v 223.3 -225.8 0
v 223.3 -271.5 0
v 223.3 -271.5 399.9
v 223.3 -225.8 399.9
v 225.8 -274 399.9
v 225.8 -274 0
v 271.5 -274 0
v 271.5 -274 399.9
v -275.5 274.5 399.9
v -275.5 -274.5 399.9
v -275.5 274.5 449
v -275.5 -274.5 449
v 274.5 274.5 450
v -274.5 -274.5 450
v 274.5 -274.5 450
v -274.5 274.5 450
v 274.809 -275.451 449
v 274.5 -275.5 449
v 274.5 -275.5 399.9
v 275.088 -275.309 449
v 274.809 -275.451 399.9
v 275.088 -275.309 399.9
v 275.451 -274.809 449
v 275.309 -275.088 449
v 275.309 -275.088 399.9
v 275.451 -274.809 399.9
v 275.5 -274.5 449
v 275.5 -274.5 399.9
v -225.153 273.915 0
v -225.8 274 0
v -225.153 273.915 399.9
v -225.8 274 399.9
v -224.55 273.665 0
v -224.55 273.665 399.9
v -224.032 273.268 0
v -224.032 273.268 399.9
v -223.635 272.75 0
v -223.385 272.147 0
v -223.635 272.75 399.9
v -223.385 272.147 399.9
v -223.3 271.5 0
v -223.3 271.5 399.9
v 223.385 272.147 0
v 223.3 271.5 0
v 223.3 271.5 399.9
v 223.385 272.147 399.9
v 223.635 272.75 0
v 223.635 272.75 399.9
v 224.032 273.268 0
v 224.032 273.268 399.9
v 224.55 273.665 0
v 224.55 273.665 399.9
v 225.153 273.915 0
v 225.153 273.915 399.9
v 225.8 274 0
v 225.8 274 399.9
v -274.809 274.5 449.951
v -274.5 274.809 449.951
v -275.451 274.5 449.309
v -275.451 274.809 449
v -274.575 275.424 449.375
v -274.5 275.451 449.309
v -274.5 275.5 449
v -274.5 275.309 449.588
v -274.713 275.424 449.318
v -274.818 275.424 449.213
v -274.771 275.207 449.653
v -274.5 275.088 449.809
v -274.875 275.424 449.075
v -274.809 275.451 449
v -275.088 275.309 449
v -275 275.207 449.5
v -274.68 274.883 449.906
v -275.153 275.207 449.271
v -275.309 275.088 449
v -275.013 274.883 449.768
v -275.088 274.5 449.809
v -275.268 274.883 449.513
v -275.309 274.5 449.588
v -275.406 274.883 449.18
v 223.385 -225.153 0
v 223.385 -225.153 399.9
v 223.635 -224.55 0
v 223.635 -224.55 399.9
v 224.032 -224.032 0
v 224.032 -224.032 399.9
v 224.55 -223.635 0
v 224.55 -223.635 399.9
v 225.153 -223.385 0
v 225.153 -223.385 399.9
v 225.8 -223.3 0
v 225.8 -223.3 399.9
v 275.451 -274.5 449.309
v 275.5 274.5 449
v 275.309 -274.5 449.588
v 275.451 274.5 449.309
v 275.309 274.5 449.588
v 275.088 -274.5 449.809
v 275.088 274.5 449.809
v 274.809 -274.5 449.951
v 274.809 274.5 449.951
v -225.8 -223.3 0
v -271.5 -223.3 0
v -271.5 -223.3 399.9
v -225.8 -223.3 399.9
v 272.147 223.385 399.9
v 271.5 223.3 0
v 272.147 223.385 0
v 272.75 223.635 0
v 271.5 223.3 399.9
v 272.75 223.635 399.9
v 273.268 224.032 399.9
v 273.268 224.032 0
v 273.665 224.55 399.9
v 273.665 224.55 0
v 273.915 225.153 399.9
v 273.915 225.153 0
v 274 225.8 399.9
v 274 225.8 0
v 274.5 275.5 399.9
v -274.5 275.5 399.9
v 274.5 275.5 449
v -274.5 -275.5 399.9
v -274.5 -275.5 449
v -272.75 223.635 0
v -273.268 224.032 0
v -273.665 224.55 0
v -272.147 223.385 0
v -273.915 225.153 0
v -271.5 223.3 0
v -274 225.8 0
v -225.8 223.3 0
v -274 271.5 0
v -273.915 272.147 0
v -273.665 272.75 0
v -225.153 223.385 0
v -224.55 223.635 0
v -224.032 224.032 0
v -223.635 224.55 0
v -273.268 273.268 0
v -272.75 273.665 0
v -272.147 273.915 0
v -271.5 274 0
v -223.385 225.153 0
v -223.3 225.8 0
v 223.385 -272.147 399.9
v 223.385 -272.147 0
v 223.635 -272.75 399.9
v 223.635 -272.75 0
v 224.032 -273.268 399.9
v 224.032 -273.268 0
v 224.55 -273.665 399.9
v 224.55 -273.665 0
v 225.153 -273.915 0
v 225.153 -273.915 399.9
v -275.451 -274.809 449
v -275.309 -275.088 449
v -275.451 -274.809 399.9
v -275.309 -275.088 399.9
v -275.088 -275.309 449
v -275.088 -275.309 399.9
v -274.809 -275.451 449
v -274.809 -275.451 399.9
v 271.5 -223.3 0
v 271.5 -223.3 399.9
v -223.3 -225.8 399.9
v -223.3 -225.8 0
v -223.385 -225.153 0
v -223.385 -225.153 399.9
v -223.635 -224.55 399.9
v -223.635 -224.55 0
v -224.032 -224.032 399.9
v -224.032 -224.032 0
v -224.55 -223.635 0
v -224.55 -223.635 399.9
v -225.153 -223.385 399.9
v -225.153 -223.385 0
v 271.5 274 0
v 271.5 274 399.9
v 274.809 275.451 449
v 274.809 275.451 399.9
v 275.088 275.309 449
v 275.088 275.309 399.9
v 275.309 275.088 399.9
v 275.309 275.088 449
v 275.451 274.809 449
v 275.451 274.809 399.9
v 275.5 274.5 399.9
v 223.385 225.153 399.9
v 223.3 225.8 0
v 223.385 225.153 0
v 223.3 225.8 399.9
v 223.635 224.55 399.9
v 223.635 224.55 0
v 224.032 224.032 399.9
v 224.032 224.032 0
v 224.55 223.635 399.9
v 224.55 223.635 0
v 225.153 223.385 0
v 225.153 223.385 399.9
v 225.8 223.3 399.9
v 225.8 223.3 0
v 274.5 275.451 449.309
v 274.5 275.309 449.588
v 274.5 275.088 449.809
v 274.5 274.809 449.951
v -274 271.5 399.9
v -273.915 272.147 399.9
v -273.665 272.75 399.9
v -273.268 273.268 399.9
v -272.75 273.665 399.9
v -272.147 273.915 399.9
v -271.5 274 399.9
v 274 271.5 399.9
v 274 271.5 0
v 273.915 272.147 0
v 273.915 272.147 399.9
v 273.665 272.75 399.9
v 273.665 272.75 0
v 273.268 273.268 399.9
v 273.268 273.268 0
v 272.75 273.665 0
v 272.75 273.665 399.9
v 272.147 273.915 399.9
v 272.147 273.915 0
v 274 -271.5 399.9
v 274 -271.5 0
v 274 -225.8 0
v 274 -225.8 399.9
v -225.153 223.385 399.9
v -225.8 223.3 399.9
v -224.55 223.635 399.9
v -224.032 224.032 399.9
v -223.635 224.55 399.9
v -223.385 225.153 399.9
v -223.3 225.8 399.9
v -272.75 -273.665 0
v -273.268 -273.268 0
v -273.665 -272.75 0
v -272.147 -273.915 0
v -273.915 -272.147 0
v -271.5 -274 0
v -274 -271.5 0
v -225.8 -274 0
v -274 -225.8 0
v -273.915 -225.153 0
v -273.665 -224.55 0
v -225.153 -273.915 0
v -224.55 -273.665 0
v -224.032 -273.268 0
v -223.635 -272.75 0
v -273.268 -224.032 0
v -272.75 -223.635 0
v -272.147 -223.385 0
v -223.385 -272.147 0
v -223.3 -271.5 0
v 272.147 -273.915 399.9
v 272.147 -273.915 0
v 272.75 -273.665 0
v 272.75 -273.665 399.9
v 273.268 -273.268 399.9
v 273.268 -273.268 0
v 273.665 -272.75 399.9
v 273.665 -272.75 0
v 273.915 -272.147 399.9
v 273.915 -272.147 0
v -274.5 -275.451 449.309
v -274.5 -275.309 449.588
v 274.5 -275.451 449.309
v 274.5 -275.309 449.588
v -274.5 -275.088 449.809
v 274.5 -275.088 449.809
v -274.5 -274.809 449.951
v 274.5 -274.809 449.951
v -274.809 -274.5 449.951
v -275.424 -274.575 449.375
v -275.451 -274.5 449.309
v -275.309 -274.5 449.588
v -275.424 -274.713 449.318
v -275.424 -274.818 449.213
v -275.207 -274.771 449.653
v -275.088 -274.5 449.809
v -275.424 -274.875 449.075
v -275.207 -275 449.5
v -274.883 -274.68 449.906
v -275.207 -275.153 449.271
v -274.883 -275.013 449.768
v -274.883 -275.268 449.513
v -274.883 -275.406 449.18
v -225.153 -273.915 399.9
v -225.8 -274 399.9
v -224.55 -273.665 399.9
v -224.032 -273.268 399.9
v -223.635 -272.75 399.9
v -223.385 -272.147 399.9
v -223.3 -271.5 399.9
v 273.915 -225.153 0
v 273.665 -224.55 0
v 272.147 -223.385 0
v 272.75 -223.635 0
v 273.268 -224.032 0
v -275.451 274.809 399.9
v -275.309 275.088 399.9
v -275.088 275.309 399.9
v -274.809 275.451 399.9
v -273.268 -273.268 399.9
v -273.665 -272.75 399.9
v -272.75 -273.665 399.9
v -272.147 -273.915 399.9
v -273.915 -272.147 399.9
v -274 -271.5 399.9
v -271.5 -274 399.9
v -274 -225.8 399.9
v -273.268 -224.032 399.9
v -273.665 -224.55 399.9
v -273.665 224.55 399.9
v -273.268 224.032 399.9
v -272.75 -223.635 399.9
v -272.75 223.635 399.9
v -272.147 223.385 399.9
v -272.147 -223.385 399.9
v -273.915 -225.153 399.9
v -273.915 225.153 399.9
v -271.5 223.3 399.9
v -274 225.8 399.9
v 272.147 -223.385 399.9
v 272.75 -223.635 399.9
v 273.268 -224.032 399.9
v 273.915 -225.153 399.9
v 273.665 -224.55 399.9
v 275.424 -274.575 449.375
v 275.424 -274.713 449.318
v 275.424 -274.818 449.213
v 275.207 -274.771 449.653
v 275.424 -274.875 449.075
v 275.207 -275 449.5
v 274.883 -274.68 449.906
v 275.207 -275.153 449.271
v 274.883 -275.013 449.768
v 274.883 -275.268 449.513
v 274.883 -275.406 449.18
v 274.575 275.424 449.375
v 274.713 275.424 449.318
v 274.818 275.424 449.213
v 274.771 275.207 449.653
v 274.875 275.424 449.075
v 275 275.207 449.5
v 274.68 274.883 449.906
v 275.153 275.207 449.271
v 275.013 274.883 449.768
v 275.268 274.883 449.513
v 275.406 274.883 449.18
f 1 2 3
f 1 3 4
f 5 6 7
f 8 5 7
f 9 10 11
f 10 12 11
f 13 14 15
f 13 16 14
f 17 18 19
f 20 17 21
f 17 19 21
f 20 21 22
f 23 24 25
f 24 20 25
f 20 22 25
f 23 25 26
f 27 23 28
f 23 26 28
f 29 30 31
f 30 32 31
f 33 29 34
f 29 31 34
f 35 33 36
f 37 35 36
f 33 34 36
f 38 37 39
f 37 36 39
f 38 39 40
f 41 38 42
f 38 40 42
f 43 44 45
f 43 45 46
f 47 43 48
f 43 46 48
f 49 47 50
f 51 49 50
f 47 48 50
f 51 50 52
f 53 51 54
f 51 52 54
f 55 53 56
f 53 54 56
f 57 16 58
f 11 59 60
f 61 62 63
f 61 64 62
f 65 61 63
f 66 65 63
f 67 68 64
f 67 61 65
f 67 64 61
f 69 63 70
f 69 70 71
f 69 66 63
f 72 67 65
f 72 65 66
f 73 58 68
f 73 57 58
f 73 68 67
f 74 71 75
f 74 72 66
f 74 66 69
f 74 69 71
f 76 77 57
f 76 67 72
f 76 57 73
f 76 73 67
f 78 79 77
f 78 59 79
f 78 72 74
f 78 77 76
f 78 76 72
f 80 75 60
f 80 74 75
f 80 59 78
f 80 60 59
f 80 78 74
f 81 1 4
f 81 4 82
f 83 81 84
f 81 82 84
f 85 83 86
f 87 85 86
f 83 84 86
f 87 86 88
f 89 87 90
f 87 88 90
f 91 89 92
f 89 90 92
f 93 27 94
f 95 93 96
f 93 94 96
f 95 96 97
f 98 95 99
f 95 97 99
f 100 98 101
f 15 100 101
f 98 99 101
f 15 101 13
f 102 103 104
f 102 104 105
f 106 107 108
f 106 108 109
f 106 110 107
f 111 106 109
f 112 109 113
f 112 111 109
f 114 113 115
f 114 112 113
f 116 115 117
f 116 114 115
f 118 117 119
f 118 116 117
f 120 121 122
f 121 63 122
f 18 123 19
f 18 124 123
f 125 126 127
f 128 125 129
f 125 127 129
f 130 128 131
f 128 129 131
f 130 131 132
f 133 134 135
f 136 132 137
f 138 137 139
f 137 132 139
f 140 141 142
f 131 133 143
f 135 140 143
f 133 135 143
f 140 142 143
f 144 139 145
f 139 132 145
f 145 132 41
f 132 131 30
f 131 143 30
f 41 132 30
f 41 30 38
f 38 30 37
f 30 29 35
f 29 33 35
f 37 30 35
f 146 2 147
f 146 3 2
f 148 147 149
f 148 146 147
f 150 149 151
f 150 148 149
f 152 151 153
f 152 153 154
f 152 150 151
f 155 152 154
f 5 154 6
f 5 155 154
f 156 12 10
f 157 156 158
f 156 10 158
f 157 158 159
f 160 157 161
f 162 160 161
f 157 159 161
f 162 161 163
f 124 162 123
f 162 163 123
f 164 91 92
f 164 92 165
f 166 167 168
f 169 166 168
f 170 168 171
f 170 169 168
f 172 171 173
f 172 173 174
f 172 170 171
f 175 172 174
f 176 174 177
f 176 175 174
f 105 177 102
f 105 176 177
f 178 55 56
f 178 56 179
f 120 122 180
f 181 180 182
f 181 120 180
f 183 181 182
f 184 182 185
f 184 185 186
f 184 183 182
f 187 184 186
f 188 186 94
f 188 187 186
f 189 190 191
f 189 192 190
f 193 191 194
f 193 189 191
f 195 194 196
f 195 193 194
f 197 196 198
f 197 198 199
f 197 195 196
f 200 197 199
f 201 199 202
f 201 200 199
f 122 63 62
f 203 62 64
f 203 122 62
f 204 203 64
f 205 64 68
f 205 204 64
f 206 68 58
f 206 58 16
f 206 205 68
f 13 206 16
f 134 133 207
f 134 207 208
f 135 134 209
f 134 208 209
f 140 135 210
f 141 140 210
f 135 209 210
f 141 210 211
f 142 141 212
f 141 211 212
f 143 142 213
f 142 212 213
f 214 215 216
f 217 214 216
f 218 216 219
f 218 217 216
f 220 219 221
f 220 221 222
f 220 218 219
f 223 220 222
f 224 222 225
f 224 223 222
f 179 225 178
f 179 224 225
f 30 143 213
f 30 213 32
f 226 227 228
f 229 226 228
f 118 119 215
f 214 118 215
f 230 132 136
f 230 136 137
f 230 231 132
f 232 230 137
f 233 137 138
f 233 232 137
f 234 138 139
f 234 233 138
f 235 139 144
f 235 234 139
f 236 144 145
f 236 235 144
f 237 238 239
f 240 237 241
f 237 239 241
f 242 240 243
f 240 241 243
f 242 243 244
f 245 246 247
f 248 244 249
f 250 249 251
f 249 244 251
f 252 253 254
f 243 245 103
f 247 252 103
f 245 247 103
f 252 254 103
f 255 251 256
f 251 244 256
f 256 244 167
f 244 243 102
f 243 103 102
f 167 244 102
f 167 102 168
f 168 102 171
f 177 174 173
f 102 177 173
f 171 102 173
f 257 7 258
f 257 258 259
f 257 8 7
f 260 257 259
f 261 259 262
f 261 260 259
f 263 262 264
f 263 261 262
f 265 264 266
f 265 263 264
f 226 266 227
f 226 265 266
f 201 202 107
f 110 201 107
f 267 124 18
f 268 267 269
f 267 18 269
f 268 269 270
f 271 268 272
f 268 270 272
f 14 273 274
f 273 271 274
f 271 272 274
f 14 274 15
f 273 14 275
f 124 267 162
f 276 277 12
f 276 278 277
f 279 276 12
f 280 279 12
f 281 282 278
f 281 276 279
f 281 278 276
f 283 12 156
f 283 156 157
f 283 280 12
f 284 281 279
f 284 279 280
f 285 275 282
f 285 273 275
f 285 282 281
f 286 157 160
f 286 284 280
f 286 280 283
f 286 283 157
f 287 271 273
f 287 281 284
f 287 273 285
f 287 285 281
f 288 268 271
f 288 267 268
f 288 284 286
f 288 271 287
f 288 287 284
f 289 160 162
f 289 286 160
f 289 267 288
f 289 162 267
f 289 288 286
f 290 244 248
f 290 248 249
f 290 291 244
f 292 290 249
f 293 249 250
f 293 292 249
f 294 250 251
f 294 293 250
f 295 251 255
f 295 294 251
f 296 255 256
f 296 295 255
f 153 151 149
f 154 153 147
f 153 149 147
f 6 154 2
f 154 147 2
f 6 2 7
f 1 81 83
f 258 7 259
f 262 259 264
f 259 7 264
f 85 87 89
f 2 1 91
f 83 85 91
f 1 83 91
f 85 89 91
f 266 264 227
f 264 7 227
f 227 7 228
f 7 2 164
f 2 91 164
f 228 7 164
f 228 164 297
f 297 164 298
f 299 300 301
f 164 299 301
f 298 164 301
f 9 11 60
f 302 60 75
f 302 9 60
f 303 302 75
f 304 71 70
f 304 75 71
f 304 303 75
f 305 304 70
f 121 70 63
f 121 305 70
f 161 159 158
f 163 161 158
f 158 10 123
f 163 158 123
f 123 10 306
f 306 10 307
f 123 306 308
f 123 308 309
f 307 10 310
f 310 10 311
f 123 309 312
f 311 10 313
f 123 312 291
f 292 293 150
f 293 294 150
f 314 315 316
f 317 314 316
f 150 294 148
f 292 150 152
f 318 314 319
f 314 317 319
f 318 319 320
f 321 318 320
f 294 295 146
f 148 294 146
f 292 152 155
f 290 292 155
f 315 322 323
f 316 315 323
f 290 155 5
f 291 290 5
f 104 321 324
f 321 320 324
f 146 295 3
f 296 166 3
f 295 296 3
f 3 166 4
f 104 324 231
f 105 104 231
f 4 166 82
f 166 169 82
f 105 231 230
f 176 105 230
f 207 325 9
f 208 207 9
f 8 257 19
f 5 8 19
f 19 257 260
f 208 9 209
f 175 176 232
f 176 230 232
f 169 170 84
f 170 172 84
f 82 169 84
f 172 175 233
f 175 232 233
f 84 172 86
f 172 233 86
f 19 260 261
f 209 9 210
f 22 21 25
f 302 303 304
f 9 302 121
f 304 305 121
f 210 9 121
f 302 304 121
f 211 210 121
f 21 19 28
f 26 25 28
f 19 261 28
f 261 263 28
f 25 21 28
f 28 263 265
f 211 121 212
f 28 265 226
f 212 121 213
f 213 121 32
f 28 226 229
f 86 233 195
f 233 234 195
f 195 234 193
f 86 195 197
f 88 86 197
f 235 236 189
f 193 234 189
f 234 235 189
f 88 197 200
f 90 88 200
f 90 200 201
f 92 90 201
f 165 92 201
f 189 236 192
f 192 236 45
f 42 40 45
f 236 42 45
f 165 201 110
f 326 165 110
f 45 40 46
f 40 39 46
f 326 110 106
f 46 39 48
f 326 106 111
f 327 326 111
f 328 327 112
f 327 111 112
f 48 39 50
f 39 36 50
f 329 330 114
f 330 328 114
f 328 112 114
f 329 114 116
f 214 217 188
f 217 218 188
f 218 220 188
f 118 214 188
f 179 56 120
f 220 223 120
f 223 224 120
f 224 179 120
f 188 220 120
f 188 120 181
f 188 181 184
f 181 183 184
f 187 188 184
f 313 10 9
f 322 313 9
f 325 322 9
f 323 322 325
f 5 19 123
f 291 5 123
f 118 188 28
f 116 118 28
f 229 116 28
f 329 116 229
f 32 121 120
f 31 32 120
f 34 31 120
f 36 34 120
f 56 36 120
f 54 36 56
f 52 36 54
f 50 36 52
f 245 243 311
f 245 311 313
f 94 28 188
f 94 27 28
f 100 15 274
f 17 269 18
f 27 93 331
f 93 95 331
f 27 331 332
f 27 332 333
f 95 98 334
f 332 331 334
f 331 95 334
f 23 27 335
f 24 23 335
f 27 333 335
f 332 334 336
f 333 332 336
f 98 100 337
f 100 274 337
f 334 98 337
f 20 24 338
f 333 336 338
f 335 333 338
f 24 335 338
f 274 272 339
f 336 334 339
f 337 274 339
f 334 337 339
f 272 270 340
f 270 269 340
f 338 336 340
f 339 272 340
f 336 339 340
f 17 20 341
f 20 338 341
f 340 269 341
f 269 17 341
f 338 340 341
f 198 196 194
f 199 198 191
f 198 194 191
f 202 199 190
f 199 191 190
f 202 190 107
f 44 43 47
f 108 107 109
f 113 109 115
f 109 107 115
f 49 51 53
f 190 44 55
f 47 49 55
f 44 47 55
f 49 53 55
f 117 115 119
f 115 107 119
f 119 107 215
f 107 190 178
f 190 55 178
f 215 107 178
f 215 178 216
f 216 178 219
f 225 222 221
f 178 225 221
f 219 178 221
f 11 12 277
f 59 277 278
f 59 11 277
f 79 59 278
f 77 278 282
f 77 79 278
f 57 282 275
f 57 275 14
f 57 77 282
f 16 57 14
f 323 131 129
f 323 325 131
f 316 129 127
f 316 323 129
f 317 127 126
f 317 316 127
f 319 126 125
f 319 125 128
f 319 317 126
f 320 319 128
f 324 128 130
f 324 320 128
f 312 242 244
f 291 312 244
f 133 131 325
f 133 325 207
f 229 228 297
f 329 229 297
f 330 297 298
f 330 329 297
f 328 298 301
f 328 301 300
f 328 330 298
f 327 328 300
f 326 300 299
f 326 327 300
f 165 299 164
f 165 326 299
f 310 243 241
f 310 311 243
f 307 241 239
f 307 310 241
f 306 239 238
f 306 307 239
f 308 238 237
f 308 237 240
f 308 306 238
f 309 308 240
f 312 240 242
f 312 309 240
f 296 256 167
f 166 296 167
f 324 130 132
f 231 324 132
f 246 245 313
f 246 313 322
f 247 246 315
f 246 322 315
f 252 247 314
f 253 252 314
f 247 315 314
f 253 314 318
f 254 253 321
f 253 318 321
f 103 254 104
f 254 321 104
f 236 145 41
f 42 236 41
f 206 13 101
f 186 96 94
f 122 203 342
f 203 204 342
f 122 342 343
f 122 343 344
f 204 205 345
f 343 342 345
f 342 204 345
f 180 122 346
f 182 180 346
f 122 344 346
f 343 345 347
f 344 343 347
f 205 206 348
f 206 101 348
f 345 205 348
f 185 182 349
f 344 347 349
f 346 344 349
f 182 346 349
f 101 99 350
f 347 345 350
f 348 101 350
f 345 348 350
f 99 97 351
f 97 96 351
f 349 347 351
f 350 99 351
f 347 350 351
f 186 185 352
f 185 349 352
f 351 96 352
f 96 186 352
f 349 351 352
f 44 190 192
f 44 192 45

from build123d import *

# Parameters (mm, degrees)
F1_W     = 551
F1_H     = 551
F1_W_2   = 50.7
F1_H_2   = 50.7
F2_DEPTH = 50.1
F4_DEPTH = 400
F5_R     = 2.5
F6_R     = 1


with BuildPart() as f2:
    # F1 (on Top) → F2 (new body)
    with BuildSketch(Plane.XY):
        Rectangle(F1_W, F1_H)
        with Locations((-248.65, -248.65)):
            Rectangle(F1_W_2, F1_H_2, mode=Mode.SUBTRACT)
        with Locations((248.65, -248.65)):
            Rectangle(F1_W_2, F1_H_2, mode=Mode.SUBTRACT)
        with Locations((-248.65, 248.65)):
            Rectangle(F1_W_2, F1_H_2, mode=Mode.SUBTRACT)
        with Locations((248.65, 248.65)):
            Rectangle(F1_W_2, F1_H_2, mode=Mode.SUBTRACT)
        with Locations((-248.65, 248.65)):
            Rectangle(F1_W_2, F1_H_2)
        with Locations((248.65, 248.65)):
            Rectangle(F1_W_2, F1_H_2)
        with Locations((-248.65, -248.65)):
            Rectangle(F1_W_2, F1_H_2)
        with Locations((248.65, -248.65)):
            Rectangle(F1_W_2, F1_H_2)
    extrude(amount=-F2_DEPTH)


with BuildPart() as f2_1:
    # F3: moved
    add(f2.part.moved(Location((0, 0, 450))))

    # F1 (on Top) → F4 (join)
    with BuildSketch(Plane.XY):
        with Locations((-248.65, 248.65)):
            Rectangle(F1_W_2, F1_H_2)
        with Locations((248.65, -248.65)):
            Rectangle(F1_W_2, F1_H_2)
        with Locations((-248.65, -248.65)):
            Rectangle(F1_W_2, F1_H_2)
        with Locations((248.65, 248.65)):
            Rectangle(F1_W_2, F1_H_2)
    extrude(amount=F4_DEPTH)

    # F5
    f5_edges = [f2_1.edges().sort_by_distance(p)[0] for p in [
        (-274, -274, 199.95),
        (-274, 223.3, 199.95),
        (223.3, 223.3, 199.95),
        (223.3, -274, 199.95),
        (-223.3, -274, 199.95),
        (-223.3, 223.3, 199.95),
        (274, -274, 199.95),
        (274, 223.3, 199.95),
        (-223.3, -223.3, 199.95),
        (274, -223.3, 199.95),
        (-223.3, 274, 199.95),
        (274, 274, 199.95),
        (223.3, -223.3, 199.95),
        (-274, -223.3, 199.95),
        (223.3, 274, 199.95),
        (-274, 274, 199.95),
    ]]
    fillet(f5_edges, radius=F5_R)

    # F6
    f6_edges = [f2_1.edges().sort_by_distance(p)[0] for p in [
        (0, -275.5, 450),
        (275.5, 0, 450),
        (-275.5, 0, 450),
        (0, 275.5, 450),
        (275.5, -275.5, 424.95),
        (-275.5, -275.5, 424.95),
        (275.5, 275.5, 424.95),
        (-275.5, 275.5, 424.95),
    ]]
    fillet(f6_edges, radius=F6_R)


solid = f2_1.part
